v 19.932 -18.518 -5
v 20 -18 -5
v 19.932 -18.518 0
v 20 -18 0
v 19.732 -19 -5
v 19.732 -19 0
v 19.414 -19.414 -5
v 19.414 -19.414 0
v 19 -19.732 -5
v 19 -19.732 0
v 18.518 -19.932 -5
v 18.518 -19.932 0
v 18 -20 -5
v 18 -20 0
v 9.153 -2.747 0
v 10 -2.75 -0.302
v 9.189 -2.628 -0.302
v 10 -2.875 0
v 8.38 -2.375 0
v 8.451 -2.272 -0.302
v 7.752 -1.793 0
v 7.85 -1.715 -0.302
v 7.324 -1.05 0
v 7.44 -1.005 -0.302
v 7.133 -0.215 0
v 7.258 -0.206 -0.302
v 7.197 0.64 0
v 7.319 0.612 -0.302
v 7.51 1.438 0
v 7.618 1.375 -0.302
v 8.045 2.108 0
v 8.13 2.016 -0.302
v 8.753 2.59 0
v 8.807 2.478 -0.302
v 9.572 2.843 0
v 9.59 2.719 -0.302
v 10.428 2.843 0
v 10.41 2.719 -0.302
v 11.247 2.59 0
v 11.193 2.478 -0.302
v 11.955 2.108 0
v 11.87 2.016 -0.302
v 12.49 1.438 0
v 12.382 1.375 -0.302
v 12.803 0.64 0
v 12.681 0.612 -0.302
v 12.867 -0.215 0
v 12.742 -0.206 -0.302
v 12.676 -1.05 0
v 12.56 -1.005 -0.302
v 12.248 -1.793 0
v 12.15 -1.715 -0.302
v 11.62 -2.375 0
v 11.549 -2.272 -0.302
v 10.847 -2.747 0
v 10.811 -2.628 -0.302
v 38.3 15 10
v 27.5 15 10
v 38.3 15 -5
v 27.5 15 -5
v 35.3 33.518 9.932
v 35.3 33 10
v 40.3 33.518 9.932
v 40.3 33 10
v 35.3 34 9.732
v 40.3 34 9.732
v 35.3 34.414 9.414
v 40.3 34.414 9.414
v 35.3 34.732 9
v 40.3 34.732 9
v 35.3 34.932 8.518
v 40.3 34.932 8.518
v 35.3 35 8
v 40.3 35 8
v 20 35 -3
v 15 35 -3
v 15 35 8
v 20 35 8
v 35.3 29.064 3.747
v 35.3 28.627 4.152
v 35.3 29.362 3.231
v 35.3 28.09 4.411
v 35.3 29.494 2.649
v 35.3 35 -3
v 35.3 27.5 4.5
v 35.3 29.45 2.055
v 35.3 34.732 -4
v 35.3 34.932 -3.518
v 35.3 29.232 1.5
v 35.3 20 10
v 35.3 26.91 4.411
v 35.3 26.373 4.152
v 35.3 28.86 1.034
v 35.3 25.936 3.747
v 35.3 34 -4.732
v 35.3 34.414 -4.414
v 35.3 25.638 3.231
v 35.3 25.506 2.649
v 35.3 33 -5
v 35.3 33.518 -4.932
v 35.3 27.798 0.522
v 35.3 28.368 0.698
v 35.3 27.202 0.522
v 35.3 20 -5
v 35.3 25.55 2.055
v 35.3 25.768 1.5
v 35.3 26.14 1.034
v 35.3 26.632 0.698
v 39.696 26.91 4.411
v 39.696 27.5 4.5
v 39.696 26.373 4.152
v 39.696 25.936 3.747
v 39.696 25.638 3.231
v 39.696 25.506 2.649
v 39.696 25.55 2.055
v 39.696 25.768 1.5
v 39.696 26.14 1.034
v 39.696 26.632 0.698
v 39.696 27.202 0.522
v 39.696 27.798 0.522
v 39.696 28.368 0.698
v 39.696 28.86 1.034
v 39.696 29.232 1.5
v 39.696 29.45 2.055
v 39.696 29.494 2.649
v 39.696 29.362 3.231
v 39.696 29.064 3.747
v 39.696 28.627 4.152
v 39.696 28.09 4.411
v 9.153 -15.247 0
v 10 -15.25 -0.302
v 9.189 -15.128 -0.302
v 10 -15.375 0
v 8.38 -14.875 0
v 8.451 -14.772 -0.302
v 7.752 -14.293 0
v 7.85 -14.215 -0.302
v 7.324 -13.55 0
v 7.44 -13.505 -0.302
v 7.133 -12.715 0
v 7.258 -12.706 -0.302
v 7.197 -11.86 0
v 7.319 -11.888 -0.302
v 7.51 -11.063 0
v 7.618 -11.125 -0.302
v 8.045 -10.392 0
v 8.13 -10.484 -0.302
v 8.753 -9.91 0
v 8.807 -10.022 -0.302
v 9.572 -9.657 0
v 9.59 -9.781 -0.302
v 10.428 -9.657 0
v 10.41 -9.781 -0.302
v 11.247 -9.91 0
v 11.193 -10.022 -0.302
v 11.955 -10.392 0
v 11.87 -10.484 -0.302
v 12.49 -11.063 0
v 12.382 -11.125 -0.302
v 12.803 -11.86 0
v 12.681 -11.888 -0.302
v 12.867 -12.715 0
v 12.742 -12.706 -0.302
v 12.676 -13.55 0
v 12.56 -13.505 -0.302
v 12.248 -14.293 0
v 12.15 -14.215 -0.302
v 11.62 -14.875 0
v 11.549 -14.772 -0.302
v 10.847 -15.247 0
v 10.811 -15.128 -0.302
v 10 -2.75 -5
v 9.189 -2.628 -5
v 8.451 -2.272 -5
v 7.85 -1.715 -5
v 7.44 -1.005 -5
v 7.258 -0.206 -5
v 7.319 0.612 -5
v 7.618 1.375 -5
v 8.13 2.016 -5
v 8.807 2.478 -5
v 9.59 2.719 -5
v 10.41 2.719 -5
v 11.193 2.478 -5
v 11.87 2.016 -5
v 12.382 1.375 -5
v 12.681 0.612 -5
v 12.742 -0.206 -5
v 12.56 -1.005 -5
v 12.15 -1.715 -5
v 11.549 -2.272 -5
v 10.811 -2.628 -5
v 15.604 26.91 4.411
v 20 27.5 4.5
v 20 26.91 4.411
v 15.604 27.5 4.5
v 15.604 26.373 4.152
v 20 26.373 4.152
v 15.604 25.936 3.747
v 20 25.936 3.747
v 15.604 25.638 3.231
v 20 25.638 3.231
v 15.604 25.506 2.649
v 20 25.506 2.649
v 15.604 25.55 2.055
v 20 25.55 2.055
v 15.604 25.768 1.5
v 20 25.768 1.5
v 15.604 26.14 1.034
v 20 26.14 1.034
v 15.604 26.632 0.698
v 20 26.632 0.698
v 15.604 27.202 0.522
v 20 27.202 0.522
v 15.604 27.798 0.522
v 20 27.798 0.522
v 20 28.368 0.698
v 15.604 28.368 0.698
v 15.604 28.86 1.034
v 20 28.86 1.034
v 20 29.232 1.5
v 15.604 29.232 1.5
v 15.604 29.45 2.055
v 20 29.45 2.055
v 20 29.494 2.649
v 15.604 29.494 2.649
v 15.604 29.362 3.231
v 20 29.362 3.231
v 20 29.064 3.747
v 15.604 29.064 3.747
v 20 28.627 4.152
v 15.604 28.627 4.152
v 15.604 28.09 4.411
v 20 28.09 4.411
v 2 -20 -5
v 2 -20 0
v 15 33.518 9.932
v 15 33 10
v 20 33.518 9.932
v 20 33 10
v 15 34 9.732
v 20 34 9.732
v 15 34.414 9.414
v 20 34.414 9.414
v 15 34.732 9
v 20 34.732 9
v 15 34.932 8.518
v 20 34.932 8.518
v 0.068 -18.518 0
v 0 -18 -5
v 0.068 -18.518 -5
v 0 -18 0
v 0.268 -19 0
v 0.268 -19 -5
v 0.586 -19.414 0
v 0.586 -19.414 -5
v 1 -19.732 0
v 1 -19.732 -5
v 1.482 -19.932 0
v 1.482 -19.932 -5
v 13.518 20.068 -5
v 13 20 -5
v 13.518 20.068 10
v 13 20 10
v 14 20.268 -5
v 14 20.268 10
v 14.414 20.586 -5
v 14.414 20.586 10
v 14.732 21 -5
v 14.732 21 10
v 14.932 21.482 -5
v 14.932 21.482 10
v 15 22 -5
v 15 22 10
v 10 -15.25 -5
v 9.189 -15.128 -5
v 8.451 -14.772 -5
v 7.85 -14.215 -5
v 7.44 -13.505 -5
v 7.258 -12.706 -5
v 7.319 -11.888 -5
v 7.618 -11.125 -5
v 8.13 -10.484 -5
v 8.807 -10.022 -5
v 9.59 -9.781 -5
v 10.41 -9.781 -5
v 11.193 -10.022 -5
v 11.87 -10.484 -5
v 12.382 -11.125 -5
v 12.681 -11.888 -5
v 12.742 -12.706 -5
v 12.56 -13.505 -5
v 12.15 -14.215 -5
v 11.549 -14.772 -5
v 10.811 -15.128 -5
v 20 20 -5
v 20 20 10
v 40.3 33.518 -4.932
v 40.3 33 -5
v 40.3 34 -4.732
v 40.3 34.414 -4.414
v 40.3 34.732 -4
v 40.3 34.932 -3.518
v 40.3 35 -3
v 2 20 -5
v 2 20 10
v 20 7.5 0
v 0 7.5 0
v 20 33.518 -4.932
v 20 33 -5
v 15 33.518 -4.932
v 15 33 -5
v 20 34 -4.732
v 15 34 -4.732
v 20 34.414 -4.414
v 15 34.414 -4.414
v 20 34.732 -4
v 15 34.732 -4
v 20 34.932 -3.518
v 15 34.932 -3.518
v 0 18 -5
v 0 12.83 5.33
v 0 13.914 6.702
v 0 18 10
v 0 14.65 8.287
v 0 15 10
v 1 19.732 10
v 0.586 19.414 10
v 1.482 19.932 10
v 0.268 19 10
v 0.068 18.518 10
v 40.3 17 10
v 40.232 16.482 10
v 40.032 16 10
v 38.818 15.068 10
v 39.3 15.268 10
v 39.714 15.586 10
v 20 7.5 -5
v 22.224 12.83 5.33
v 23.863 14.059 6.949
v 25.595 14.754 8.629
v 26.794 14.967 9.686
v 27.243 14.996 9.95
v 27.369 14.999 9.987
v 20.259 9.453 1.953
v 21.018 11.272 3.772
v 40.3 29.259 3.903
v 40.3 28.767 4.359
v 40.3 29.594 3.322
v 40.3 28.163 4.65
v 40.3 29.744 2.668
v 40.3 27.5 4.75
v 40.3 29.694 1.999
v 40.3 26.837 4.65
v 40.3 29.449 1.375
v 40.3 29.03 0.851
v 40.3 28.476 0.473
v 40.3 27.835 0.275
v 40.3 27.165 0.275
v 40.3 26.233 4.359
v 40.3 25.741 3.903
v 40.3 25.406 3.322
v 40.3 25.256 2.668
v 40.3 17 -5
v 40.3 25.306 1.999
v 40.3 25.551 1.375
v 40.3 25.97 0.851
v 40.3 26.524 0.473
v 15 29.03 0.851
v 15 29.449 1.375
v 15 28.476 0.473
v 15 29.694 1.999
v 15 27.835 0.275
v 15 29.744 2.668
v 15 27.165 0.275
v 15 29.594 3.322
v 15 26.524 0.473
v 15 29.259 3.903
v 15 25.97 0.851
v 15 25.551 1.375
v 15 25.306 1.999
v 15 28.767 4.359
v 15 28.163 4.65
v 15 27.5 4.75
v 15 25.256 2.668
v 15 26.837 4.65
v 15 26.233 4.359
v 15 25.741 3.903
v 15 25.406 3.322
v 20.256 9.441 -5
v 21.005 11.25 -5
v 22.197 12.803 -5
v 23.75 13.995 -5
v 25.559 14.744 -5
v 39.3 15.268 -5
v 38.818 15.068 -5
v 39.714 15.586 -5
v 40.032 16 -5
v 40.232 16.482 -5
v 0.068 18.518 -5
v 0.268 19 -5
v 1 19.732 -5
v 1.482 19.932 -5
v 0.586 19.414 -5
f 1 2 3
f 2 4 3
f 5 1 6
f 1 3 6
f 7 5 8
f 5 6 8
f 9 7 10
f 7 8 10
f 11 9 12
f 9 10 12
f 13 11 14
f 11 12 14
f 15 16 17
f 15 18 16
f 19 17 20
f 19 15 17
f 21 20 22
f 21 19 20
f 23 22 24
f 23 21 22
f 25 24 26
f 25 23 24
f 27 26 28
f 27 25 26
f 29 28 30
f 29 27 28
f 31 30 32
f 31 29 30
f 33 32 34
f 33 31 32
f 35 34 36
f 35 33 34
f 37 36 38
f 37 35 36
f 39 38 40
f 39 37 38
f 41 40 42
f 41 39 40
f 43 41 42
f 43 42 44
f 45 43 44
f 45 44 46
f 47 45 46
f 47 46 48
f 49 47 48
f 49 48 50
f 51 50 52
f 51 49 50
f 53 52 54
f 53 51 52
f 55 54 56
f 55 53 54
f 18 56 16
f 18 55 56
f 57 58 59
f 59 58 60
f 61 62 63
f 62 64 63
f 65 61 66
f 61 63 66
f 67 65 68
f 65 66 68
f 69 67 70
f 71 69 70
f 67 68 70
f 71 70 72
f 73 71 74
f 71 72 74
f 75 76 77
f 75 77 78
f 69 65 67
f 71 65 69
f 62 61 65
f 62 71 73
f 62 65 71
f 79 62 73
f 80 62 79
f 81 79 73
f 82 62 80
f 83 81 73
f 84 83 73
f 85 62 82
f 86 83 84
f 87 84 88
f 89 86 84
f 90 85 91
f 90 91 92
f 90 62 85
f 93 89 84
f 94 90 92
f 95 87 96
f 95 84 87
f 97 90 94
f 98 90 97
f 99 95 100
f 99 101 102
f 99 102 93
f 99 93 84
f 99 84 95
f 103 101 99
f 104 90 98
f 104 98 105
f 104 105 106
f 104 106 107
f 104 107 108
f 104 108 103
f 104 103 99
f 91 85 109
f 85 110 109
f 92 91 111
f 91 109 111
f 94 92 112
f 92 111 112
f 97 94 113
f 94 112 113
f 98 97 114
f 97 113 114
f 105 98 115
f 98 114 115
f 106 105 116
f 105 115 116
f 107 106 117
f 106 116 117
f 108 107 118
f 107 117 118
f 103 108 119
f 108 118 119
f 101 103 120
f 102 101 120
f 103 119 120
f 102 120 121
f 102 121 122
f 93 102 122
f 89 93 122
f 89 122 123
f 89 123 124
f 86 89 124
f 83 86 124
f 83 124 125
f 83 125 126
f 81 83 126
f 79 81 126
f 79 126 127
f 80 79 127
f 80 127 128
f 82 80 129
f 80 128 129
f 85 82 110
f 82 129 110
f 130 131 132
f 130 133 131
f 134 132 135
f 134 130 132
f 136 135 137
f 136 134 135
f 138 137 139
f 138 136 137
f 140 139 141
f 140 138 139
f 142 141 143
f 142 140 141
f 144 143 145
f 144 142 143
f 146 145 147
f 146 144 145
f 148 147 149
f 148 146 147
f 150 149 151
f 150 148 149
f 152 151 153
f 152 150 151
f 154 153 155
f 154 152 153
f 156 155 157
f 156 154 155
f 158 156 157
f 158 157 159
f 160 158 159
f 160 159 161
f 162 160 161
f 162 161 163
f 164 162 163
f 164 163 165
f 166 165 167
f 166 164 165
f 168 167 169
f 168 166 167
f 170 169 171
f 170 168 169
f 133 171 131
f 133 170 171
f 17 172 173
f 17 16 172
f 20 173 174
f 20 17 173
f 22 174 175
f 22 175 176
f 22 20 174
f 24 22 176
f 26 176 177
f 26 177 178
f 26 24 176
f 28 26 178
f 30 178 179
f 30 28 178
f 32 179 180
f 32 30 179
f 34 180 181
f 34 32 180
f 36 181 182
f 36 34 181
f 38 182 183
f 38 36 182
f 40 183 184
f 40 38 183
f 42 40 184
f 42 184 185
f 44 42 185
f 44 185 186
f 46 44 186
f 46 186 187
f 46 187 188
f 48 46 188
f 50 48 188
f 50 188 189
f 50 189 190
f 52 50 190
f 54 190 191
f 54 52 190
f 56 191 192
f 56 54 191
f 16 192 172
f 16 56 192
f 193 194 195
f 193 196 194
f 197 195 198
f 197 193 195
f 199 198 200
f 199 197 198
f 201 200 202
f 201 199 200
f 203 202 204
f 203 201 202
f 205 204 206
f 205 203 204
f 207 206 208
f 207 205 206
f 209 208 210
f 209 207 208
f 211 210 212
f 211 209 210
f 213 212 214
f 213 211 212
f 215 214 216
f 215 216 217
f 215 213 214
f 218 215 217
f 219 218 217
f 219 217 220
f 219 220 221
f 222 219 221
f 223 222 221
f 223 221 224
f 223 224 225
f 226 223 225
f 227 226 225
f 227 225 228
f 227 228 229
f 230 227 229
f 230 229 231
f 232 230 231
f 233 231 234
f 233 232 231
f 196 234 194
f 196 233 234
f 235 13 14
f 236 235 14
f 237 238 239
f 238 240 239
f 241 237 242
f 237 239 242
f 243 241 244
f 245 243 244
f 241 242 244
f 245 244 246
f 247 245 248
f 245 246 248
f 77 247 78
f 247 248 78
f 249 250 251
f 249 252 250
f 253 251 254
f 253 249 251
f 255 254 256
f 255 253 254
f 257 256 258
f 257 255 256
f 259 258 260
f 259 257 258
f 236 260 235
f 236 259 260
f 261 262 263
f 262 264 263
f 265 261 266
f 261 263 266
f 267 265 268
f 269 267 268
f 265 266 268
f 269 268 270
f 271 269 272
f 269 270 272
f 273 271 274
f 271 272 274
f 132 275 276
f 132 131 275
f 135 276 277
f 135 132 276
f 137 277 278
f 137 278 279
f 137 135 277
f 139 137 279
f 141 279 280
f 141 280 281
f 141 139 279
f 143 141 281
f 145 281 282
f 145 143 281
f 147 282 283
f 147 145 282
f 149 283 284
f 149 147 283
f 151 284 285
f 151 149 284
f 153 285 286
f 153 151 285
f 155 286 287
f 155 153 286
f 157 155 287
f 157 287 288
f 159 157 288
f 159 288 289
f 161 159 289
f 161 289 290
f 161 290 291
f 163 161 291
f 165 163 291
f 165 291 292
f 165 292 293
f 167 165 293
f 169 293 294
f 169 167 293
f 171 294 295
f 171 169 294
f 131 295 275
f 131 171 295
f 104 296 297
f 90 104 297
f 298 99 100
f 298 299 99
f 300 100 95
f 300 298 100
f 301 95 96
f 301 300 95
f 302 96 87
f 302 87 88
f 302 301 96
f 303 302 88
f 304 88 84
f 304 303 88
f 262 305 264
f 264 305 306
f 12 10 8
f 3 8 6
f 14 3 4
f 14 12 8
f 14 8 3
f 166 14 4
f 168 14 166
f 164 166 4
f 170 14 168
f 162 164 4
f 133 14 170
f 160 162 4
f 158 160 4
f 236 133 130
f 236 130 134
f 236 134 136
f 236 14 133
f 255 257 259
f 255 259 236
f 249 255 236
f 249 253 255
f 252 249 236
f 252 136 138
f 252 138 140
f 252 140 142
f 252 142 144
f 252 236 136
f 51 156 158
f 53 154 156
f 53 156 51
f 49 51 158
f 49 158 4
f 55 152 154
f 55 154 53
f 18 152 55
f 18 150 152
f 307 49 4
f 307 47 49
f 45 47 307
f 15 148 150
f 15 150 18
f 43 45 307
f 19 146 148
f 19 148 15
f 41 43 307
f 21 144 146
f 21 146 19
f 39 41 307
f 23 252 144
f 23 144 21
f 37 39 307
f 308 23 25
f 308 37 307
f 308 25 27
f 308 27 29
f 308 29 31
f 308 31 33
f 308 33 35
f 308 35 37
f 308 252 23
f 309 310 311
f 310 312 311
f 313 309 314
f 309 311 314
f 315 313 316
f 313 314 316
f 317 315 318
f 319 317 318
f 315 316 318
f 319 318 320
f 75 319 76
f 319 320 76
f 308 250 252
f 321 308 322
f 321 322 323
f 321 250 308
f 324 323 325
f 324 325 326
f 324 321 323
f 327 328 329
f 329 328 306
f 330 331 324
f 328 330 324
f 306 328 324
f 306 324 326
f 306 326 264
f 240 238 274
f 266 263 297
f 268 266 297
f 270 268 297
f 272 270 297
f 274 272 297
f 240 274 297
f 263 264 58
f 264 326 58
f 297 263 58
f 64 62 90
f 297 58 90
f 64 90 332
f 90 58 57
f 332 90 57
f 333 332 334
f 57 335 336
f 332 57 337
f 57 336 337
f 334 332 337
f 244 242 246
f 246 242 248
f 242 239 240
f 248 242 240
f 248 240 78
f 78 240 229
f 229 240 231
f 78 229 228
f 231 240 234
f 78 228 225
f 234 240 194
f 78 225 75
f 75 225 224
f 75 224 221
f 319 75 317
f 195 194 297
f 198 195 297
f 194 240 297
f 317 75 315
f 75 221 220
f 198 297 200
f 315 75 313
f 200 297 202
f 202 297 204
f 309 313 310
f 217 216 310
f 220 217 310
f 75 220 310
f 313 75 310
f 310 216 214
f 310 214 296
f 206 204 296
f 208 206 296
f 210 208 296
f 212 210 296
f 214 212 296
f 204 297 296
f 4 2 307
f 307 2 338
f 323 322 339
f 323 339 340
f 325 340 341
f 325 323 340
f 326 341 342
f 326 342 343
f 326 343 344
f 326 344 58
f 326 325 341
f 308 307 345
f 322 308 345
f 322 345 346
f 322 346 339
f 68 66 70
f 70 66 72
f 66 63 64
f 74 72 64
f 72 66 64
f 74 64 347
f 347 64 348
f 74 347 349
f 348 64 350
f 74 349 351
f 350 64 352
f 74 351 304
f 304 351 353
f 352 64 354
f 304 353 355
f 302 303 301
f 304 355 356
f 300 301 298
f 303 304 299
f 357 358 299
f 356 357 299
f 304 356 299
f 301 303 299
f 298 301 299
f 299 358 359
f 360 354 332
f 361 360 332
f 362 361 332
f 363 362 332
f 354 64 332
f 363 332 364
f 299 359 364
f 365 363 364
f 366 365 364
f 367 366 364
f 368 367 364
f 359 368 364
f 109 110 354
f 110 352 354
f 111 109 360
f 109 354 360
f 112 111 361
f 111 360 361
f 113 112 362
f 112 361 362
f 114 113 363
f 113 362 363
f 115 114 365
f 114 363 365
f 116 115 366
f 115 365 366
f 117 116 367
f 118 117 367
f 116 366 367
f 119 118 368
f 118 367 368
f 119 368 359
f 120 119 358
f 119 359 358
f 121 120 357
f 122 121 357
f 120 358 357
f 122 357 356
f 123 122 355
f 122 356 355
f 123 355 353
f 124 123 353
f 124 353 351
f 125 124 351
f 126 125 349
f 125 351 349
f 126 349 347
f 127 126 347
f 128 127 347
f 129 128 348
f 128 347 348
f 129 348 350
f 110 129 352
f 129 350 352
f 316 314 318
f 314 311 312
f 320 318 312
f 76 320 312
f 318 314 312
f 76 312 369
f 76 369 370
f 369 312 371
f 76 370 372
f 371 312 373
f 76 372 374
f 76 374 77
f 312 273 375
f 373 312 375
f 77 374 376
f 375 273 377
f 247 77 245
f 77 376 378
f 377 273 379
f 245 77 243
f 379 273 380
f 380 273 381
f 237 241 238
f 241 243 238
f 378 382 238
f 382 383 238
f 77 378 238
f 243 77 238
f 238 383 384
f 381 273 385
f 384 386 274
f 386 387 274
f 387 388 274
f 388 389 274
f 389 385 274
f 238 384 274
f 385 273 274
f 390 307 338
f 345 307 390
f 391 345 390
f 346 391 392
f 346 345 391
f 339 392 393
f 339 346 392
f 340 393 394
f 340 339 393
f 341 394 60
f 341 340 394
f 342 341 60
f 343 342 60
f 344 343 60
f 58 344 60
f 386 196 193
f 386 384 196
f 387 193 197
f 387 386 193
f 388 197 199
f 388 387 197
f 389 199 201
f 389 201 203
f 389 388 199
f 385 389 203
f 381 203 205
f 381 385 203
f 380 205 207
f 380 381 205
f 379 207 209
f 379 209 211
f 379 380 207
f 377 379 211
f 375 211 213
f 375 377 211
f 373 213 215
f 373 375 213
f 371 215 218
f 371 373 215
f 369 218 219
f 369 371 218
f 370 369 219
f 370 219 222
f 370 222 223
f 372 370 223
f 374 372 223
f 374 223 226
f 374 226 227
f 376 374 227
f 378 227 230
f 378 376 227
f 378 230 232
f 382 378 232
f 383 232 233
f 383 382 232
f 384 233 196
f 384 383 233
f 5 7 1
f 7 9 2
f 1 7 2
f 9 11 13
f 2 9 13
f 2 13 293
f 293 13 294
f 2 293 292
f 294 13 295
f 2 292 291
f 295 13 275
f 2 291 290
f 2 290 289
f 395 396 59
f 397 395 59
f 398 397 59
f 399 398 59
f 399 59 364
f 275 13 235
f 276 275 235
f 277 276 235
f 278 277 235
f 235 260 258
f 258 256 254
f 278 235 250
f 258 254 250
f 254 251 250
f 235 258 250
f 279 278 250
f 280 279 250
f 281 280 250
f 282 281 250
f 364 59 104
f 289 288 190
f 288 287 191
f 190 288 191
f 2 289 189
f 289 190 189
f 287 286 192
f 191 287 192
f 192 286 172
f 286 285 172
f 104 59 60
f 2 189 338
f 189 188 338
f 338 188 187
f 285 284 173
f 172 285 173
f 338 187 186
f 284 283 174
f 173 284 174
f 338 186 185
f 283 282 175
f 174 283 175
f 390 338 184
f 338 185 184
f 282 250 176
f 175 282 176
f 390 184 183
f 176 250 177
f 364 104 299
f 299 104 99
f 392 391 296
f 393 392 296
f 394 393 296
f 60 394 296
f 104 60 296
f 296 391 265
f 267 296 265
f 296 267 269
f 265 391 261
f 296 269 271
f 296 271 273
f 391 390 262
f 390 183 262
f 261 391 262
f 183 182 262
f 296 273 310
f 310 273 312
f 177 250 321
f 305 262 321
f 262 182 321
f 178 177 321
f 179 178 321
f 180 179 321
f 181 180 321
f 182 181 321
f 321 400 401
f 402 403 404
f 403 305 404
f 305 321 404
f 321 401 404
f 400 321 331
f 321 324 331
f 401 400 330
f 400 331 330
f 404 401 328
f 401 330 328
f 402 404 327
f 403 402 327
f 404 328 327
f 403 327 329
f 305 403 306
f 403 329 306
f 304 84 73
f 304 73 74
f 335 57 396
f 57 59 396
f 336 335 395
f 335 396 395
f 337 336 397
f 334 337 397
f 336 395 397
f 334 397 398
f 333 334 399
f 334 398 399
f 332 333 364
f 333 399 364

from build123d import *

# Parameters (mm, degrees)
BOSS_EXTRUDE1_DEPTH                 = 20
BOSS_EXTRUDE2_DEPTH                 = 20.3
SKETCH4_W                           = 5
SKETCH4_H                           = 15
BOSS_EXTRUDE3_DEPTH                 = 15
CHAMFER2_SIZE                       = 7.5
FILLET1_R                           = 7.5
F_5_5_5_5_DIAMETER_HOLE1_AT_2_COUNT = 2
F_5_5_5_5_DIAMETER_HOLE1_AT_2_PITCH = 12.50000000000005
FILLET2_R                           = 2


with BuildPart() as part:
    # Sketch1 → Boss-Extrude1 (new body)
    with BuildSketch(Plane(origin=(0, 0, 0), x_dir=(0, 0, -1), z_dir=(1, 0, 0))):
        Polygon((-4.59e-15, 15), (-6.12e-15, 20), (-10.000000000000007, 20), (-10.000000000000004, 15), align=None)
        Polygon((4.999999999999994, -20), (6.12e-15, -20), (-6.12e-15, 20), (4.999999999999994, 20), align=None)
    extrude(amount=BOSS_EXTRUDE1_DEPTH)

    # Sketch3 → Boss-Extrude2 (add)
    with BuildSketch(Plane(origin=(20, 0, 0), x_dir=(0, 0, -1), z_dir=(1, 0, 0))):
        Polygon((-10.000000000000007, 20), (-10.000000000000004, 15), (4.999999999999994, 15), (4.999999999999994, 20), align=None)
    extrude(amount=BOSS_EXTRUDE2_DEPTH)

    # Sketch4 → Boss-Extrude3 (add)
    with BuildSketch(Plane(origin=(0, 20, 0), x_dir=(1, 0, 0), z_dir=(0, 1, 0))):
        Polygon((20.00000000000001, -10.000000000000007), (20.000000000000004, 4.999999999999994), (15.000000000000007, 4.999999999999994), (15.000000000000007, -10.000000000000007), align=None)
        with Locations((37.800000000000004, -2.5000000000000067)):
            Rectangle(SKETCH4_W, SKETCH4_H)
    extrude(amount=BOSS_EXTRUDE3_DEPTH)

    # Chamfer2
    chamfer2_edges = [part.edges().sort_by_distance(p)[0] for p in [
        (10, 15, 4.96e-15),
    ]]
    chamfer(chamfer2_edges, length=CHAMFER2_SIZE)

    # Fillet1
    # the kernel refuses this fillet: 7.5 mm, written as the material it adds along each edge
    with BuildSketch(Plane(origin=(0, 15, 7.500000000000005), x_dir=(0, -0.7071067811865472, -0.7071067811865479), z_dir=(1, 0, 0))) as fillet1_piece_1:
        with BuildLine():
            CenterArc((3.068709480812204, -7.500000000000002), FILLET1_R, 90, 40.15544377727605)
            Line((-1.7677669529663684, -1.7677669529663669), (0, 0))
            Line((0, 0), (3.0687094808122044, -1.2e-16))
        make_face()
    extrude(amount=20)
    with BuildSketch(Plane(origin=(20, 15, 26.250000000000007), x_dir=(0, -1, 0), z_dir=(0, 0, -1))) as fillet1_piece_2_section:
        with BuildLine():
            CenterArc((FILLET1_R, -FILLET1_R), FILLET1_R, 90, 90)
            Line((0, -FILLET1_R), (0, 0))
            Line((0, 0), (FILLET1_R, 0))
        make_face()
    fillet1_piece_2 = extrude(amount=31.25, mode=Mode.PRIVATE)
    fillet1_piece_2 = split(fillet1_piece_2, bisect_by=Plane(origin=(20, 24.375, 16.875000000000014), z_dir=(0, 0.7071067811865477, -0.7071067811865474)), keep=Keep.TOP, mode=Mode.PRIVATE)
    add(fillet1_piece_2)
    with BuildSketch(Plane(origin=(20, 15, 26.250000000000007), x_dir=(0, -1, 0), z_dir=(0, 0, -1))) as fillet1_piece_3a_section:
        with BuildLine():
            CenterArc((FILLET1_R, -FILLET1_R), FILLET1_R, 90, 90)
            Line((0, -FILLET1_R), (0, 0))
            Line((0, 0), (FILLET1_R, 0))
        make_face()
    fillet1_piece_3a = extrude(amount=31.25, mode=Mode.PRIVATE)
    fillet1_piece_3a = split(fillet1_piece_3a, bisect_by=Plane(origin=(20, 15.000000000000012, 10), z_dir=(0, 7.1e-16, -1)), keep=Keep.TOP, mode=Mode.PRIVATE)
    fillet1_piece_3a = split(fillet1_piece_3a, bisect_by=Plane(origin=(20, 24.375, 16.87500000000001), z_dir=(0, -0.7071067811865477, 0.7071067811865474)), keep=Keep.TOP, mode=Mode.PRIVATE)
    with BuildSketch(Plane(origin=(0, 15, 7.500000000000005), x_dir=(0, -0.7071067811865472, -0.7071067811865479), z_dir=(1, 0, 0))) as fillet1_piece_3b_section:
        with BuildLine():
            CenterArc((3.068709480812204, -7.500000000000002), FILLET1_R, 90, 40.15544377727605)
            Line((-1.7677669529663684, -1.7677669529663669), (0, 0))
            Line((0, 0), (3.0687094808122044, -1.2e-16))
        make_face()
    fillet1_piece_3b = extrude(amount=27.67177370203051, mode=Mode.PRIVATE)
    fillet1_piece_3b = split(fillet1_piece_3b, bisect_by=Plane(origin=(20, 15, 7.500000000000005), z_dir=(1, 0, 0)), keep=Keep.TOP, mode=Mode.PRIVATE)
    fillet1_piece_3 = fillet1_piece_3a & fillet1_piece_3b
    add(fillet1_piece_3)

    # Sketch7 → Ø4.0 (4) Diameter Hole1 (revolve, cut)
    with BuildSketch(Plane(origin=(15.000000000000007, 27.500000000000004, 2.5000000000000075), x_dir=(0, 0, 1), z_dir=(0, 1, 0))):
        Polygon((0, 0), (-1.22e-15, 5.000000000000001), (1.9999999999999967, 5.000000000000001), (1.9999999999999996, 0.6035533905932753), (2.2500000000000004, -1.73e-15), align=None)
    f_4_0_4_diameter_hole1 = revolve(axis=Axis((8.650000000000016, 27.500000000000004, 2.5000000000000075), (1, 0, 0)), mode=Mode.SUBTRACT)

    # Mirror1: Ø4.0 (4) Diameter Hole1 across plane
    add(f_4_0_4_diameter_hole1.mirror(Plane(origin=(27.65000000000001, 0, -6.4e-15), x_dir=(2.3e-16, 0, 1), z_dir=(1, 0, -2.3e-16))), mode=Mode.SUBTRACT)

    # Sketch9 → Ø5.5 (5.5) Diameter Hole1 (revolve, cut)
    with BuildSketch(Plane(origin=(10, 0, 0), x_dir=(0, -1, 0), z_dir=(1, 0, 0))):
        Polygon((0, 0), (-1.22e-15, 4.999999999999994), (2.749999999999999, 4.999999999999994), (2.7499999999999996, 0.30177669529663986), (2.875, 0), align=None)
    f_5_5_5_5_diameter_hole1 = revolve(axis=Axis((10, 0, 6.349999999999991), (0, 0, -1)), mode=Mode.SUBTRACT)

    # Ø5.5 (5.5) Diameter Hole1 at 2: Ø5.5 (5.5) Diameter Hole1 ×2
    with Locations(*[(0, -i * F_5_5_5_5_DIAMETER_HOLE1_AT_2_PITCH, 0) for i in range(1, F_5_5_5_5_DIAMETER_HOLE1_AT_2_COUNT)]):
        add(f_5_5_5_5_diameter_hole1, mode=Mode.SUBTRACT)

    # Fillet2
    fillet2_edges = [part.edges().sort_by_distance(p)[0] for p in [
        (0, -20, -2.5),
        (20, -20, -2.5),
        (40.3, 15, 2.5000000000000053),
        (17.500000000000007, 35, 10.000000000000007),
        (17.500000000000007, 35, -4.999999999999994),
        (15.000000000000007, 20, 2.500000000000007),
        (37.800000000000004, 35, -4.999999999999994),
        (37.800000000000004, 35, 10.000000000000007),
        (0, 20, 2.500000000000006),
    ]]
    fillet(fillet2_edges, radius=FILLET2_R)


solid = part.part
